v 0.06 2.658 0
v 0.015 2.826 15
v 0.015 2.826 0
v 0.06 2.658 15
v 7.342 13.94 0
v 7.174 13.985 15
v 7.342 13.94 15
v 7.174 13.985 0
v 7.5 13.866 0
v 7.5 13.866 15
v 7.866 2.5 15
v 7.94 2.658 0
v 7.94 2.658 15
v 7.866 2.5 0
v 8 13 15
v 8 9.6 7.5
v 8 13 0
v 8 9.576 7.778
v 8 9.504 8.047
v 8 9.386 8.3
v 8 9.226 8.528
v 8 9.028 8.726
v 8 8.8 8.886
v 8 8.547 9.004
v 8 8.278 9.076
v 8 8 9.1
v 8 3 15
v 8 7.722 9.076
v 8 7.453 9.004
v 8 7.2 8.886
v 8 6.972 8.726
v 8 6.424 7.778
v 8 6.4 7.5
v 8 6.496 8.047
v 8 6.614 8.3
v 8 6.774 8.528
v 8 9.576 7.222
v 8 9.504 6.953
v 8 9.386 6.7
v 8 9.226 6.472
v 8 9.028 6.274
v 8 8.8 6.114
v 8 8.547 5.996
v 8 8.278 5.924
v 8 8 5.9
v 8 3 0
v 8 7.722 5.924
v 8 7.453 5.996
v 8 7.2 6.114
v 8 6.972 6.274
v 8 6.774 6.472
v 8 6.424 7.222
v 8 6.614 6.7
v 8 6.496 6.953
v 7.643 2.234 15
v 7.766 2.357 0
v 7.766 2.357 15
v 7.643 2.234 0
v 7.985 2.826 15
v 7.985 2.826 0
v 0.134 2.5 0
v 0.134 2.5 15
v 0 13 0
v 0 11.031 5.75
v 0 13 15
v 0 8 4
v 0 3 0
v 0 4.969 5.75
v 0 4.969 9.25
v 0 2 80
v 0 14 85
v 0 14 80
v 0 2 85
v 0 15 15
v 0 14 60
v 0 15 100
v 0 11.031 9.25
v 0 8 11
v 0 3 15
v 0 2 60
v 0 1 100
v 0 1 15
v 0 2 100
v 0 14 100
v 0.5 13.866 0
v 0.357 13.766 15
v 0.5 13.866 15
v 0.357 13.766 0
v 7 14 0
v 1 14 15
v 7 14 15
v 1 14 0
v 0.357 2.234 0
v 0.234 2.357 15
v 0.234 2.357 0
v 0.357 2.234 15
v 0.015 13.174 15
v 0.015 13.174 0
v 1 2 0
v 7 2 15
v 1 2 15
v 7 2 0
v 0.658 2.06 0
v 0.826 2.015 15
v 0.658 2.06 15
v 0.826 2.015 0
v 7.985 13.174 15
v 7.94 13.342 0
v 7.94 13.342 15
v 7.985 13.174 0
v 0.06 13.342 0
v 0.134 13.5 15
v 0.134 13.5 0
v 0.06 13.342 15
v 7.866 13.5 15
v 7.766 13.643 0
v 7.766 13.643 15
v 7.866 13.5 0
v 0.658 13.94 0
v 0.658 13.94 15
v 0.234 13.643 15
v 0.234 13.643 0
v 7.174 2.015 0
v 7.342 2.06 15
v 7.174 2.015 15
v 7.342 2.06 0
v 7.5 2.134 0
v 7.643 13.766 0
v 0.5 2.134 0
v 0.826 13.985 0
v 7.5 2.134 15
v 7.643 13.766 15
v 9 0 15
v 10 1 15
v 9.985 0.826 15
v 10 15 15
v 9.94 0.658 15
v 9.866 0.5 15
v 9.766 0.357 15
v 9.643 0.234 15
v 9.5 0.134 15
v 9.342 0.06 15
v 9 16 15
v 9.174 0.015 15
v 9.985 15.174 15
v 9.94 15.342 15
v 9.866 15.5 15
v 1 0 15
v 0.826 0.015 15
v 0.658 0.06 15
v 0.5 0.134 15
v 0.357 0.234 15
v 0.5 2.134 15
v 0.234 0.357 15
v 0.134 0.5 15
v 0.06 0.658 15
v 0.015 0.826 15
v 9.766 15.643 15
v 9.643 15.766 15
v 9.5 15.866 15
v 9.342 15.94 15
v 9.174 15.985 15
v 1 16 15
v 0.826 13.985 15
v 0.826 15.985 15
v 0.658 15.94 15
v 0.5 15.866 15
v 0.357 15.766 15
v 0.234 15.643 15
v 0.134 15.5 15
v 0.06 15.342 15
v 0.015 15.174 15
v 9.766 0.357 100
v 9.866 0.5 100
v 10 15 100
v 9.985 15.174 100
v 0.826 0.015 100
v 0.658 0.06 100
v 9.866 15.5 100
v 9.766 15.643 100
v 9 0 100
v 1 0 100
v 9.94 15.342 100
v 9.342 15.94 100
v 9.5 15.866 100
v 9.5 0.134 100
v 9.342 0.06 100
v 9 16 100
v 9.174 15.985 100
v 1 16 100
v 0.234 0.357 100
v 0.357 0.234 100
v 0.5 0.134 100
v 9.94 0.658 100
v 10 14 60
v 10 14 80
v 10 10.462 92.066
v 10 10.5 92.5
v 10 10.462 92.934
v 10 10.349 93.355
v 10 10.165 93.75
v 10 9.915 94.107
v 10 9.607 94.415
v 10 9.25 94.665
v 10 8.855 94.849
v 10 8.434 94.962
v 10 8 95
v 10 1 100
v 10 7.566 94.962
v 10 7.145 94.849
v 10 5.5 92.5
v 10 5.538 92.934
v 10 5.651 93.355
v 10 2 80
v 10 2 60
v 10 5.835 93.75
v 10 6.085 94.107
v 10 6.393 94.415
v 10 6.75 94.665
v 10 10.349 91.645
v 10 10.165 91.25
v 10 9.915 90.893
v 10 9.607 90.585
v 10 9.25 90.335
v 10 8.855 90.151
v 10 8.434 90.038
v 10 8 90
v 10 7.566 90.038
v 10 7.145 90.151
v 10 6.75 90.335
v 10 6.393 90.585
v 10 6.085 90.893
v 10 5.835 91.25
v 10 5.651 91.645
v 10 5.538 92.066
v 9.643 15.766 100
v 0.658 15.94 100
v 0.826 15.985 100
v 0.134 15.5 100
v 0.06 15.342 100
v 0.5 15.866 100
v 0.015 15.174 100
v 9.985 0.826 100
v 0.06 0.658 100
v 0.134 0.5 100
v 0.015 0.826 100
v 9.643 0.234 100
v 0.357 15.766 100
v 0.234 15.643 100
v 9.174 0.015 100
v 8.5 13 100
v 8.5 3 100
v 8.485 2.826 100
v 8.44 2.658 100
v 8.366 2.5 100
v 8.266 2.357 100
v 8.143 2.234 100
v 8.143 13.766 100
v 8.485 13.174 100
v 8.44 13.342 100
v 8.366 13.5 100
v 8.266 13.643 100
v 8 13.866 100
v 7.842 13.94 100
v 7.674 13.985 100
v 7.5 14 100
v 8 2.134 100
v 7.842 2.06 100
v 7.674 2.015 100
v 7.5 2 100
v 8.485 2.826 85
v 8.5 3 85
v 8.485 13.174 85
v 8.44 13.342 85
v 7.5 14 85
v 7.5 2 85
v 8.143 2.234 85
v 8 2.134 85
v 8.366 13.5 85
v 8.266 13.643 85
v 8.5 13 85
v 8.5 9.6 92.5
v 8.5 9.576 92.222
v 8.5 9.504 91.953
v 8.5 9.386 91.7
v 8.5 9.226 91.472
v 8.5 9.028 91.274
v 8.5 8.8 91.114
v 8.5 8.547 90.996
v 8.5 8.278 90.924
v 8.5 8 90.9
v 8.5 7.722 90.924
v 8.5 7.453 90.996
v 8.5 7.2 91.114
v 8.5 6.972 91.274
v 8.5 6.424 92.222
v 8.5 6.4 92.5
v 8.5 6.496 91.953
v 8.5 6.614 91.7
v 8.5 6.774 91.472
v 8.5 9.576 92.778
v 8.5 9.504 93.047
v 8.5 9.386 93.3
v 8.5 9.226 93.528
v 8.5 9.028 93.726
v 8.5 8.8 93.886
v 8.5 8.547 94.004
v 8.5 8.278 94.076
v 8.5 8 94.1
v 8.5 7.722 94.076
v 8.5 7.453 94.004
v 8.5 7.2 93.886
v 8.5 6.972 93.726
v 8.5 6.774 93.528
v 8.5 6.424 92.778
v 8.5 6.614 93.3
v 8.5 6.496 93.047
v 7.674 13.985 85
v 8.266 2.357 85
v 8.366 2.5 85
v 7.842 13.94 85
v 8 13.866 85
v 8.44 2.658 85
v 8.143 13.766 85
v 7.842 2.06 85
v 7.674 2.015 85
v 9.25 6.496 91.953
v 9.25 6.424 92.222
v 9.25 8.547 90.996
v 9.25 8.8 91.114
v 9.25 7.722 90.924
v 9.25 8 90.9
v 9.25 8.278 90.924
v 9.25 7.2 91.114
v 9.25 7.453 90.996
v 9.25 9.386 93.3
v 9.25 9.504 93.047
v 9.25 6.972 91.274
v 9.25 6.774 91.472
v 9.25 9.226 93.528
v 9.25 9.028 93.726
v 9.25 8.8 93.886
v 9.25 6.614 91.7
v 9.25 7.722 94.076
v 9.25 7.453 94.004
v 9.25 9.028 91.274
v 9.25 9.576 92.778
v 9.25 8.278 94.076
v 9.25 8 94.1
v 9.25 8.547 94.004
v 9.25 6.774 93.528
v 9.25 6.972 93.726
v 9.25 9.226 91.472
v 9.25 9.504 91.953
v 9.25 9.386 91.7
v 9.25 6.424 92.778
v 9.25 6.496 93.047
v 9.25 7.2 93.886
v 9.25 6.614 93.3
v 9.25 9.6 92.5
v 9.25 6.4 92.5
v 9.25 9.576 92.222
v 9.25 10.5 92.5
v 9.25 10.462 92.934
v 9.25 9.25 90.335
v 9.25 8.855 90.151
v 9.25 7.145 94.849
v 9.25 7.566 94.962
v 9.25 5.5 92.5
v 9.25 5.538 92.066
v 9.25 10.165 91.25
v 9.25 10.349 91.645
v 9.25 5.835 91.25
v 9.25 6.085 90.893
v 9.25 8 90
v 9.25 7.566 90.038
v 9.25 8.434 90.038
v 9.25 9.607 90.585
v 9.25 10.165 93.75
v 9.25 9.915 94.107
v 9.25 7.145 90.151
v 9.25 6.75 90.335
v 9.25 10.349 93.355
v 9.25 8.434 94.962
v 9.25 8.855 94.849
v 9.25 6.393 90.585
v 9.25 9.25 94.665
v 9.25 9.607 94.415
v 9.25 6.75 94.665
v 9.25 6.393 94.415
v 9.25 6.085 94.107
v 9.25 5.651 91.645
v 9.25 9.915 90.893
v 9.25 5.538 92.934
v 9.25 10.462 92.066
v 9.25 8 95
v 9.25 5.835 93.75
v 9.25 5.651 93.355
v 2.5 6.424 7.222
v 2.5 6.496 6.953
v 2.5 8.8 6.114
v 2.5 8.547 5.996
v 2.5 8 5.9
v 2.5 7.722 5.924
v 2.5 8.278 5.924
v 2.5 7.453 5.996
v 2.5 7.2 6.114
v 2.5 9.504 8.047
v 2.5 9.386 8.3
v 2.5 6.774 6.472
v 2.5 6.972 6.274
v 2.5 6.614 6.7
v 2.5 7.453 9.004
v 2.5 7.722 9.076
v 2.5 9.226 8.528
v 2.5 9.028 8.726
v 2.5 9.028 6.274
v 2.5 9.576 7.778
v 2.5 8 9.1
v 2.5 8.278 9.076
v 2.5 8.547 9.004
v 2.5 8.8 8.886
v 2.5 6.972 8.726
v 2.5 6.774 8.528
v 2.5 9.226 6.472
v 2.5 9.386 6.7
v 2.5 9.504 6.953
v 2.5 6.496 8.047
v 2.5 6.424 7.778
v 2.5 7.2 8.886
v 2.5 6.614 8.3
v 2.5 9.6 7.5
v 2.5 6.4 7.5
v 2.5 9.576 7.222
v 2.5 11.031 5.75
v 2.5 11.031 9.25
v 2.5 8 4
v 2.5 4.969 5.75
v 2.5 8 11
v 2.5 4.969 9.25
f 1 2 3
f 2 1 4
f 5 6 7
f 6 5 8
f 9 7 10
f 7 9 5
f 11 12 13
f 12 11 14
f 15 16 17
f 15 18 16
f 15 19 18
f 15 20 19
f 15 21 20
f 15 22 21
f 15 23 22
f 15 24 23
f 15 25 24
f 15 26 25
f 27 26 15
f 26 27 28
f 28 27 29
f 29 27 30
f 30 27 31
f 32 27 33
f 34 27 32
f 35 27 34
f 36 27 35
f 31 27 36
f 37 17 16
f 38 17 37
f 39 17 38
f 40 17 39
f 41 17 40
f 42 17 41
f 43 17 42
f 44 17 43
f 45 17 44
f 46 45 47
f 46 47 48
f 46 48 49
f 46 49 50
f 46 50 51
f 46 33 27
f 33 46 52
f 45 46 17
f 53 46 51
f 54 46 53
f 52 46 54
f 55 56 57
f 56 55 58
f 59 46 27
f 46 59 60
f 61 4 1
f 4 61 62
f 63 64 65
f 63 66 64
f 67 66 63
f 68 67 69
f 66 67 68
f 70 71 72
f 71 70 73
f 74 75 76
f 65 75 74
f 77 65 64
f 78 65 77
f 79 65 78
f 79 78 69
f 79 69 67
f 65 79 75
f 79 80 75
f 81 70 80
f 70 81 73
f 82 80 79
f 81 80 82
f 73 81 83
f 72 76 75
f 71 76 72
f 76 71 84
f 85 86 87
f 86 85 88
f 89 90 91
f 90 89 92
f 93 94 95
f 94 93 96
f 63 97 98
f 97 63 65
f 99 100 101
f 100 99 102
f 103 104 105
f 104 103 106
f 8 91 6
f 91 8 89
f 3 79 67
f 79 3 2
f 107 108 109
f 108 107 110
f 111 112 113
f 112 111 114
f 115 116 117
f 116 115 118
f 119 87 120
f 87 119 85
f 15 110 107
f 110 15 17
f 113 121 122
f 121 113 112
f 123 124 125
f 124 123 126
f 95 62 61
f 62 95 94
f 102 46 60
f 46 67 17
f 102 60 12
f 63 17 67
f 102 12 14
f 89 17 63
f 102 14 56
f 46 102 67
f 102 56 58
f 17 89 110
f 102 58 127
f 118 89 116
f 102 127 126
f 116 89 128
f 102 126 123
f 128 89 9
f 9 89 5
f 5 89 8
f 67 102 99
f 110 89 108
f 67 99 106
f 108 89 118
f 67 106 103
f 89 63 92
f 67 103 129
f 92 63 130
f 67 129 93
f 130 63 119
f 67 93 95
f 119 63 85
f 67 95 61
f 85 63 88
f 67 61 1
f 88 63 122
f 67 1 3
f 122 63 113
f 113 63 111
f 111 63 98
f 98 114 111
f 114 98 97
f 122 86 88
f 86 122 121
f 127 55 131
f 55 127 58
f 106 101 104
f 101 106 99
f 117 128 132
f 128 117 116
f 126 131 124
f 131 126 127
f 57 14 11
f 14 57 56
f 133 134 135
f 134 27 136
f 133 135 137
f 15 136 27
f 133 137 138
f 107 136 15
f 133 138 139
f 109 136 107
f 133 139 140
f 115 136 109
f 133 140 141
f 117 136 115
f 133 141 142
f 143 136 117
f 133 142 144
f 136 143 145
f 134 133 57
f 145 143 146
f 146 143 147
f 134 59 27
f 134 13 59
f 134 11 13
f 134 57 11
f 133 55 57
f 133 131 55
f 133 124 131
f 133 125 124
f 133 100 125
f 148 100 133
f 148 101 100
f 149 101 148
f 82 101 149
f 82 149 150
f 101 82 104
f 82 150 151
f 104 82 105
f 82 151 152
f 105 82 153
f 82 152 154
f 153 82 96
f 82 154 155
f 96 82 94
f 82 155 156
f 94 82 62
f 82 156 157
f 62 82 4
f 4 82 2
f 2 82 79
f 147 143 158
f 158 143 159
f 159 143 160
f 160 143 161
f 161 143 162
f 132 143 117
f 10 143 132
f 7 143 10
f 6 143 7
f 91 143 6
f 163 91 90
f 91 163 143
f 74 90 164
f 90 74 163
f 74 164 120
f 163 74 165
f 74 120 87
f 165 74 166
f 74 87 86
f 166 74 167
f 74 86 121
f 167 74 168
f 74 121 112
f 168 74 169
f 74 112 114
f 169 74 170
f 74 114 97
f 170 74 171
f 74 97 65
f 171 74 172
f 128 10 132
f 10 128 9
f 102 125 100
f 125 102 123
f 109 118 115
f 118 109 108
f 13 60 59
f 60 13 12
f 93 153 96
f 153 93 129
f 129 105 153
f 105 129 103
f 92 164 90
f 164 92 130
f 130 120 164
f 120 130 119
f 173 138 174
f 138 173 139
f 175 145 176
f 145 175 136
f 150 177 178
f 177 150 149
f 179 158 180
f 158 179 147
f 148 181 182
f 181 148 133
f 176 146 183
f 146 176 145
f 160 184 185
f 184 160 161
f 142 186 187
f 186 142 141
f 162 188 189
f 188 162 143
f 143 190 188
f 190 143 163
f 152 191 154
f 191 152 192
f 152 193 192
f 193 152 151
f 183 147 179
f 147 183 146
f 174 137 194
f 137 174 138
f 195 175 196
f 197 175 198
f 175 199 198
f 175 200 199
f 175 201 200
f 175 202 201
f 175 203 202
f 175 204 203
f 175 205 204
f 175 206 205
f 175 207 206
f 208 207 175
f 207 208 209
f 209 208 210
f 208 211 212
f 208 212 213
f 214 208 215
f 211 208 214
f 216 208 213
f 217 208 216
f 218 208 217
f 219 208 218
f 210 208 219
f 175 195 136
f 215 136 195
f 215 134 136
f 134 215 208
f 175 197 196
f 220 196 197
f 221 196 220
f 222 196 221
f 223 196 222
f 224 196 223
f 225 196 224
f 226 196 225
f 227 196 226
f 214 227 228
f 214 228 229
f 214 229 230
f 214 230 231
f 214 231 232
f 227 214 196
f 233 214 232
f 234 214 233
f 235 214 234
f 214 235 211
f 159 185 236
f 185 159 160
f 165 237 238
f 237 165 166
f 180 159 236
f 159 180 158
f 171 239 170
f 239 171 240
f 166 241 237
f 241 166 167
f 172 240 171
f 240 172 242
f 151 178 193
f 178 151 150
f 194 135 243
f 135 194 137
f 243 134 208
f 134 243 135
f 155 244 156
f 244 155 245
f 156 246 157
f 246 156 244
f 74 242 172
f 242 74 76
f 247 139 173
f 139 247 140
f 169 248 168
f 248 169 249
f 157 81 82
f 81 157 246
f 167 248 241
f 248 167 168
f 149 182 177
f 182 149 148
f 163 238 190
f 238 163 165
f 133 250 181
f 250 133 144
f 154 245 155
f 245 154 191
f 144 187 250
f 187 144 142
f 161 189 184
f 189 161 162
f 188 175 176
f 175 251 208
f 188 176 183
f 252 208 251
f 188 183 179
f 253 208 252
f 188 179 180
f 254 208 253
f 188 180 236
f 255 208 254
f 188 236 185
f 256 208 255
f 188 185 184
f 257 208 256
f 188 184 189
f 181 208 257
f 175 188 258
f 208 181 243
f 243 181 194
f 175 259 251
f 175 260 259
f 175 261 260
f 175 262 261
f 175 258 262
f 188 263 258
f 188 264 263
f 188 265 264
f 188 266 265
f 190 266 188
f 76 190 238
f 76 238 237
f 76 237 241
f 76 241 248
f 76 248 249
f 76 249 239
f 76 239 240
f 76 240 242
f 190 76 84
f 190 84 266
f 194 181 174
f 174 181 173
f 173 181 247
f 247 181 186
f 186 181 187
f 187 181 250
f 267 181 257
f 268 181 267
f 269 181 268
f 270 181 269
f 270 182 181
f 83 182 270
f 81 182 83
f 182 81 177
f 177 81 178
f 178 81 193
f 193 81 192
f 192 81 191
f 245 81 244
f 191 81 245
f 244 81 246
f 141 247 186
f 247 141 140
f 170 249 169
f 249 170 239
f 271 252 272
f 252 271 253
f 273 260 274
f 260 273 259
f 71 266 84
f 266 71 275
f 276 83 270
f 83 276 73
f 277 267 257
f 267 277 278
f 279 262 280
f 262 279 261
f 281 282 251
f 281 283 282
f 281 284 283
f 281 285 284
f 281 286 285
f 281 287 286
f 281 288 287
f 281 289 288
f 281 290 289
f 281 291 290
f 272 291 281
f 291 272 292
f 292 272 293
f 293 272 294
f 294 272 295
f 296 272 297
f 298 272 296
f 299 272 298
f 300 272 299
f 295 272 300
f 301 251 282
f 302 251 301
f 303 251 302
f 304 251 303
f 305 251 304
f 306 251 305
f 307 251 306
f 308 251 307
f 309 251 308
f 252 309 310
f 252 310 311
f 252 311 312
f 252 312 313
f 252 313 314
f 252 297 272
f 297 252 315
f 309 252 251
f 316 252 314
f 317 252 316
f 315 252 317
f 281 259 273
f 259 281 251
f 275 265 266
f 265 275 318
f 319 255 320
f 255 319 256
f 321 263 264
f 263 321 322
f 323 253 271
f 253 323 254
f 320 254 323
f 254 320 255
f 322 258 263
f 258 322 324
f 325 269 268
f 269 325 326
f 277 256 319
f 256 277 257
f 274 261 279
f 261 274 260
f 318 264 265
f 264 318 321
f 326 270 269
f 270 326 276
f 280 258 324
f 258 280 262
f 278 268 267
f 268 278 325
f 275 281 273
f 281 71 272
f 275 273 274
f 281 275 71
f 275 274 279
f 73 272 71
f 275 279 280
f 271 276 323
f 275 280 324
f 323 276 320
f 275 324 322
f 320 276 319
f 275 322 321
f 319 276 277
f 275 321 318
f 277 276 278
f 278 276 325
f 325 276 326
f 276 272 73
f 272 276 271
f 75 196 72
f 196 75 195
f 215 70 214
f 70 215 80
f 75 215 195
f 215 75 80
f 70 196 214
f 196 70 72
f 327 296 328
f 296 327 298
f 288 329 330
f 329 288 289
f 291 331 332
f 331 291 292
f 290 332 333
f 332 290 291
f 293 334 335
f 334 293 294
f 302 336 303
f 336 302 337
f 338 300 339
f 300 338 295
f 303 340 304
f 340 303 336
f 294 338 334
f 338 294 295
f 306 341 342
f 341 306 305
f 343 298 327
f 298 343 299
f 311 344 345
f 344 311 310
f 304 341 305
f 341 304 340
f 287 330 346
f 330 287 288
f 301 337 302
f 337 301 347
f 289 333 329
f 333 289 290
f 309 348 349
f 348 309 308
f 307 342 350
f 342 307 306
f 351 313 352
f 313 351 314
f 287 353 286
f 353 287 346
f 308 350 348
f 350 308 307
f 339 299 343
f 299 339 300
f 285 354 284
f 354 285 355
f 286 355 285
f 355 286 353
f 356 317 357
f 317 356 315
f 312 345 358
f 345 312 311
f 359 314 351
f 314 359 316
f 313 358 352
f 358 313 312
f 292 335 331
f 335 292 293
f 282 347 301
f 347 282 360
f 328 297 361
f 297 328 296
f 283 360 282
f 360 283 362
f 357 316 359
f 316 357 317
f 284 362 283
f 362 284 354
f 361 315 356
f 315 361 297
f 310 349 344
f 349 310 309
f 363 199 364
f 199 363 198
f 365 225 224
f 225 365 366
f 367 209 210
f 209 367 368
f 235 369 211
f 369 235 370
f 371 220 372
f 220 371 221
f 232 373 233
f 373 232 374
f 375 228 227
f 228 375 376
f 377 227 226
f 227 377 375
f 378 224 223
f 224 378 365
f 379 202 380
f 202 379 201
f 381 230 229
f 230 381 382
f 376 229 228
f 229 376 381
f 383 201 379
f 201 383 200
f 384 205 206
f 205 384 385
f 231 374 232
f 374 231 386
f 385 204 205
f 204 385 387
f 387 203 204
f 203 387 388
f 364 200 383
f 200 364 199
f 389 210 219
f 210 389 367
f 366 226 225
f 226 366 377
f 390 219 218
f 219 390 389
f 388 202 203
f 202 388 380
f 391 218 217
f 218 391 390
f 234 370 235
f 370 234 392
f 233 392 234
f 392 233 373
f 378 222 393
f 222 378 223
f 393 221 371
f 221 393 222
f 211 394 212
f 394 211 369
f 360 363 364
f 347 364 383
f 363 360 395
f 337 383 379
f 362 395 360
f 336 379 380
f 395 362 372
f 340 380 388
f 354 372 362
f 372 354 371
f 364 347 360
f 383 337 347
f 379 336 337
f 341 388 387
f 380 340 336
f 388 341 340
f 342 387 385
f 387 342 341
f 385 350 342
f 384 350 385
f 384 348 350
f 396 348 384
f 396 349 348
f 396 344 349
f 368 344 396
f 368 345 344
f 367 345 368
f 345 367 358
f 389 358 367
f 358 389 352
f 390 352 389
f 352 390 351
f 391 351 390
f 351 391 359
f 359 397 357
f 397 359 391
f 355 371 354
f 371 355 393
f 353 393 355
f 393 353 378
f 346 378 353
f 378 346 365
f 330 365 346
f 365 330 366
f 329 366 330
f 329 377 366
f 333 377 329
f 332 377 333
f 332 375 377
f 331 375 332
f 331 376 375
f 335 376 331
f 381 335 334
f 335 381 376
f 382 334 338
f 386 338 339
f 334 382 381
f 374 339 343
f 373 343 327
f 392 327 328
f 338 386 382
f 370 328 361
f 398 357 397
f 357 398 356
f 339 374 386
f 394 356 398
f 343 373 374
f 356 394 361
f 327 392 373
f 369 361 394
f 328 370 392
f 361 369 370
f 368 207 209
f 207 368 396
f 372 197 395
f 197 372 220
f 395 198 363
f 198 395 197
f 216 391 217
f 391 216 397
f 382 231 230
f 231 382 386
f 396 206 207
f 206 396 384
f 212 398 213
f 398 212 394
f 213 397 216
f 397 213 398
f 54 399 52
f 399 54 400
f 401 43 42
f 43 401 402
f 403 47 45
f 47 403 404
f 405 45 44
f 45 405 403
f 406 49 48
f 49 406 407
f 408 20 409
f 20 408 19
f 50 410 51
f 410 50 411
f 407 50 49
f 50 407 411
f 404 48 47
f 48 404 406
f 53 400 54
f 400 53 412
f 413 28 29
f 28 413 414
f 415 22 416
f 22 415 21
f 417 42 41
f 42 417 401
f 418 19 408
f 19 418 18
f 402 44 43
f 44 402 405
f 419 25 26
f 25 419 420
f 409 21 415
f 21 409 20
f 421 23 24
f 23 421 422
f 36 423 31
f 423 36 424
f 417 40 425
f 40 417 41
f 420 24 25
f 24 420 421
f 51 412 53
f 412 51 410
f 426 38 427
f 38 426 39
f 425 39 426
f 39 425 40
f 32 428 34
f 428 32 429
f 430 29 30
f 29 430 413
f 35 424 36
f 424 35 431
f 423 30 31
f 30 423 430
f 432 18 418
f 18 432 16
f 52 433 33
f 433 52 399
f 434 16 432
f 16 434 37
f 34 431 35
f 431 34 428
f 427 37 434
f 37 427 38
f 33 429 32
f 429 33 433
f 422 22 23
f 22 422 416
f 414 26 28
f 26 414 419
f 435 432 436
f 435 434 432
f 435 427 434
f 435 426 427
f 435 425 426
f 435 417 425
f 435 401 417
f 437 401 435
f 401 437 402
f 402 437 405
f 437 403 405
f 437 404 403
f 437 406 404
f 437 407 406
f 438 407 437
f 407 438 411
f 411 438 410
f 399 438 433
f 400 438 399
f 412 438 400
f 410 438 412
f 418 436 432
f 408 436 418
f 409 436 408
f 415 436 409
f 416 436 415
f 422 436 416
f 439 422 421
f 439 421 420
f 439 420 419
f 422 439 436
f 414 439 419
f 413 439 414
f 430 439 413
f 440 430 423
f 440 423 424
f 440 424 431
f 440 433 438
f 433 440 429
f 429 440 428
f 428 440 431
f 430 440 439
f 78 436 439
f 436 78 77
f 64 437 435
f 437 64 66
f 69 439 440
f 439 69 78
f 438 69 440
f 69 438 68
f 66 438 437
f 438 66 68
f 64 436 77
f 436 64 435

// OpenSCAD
/*
 * Tidegrow Pillar
 * Copyright (c) 2022 Lone Dynamics Corporation. All rights reserved.
 *
 */ 

$fn = 36;

pillar();
 
module pillar() {

	p_height = 100;
	p_width = 16;
	p_depth = 10;
	p_roundness = 1;

	pn_height = 15;
	pn_width = 12;
	pn_depth = 8;
	pn_roundness = 1;
	
	difference() {
		
		union () {
			
			translate([0,(p_width/2)-(pn_width/2),0])
				roundedcube(pn_depth, pn_width, pn_height, p_roundness);
			
			translate([0,0,pn_height])
				roundedcube(p_depth, p_width, p_height-pn_height, pn_roundness);
		}
		
		translate([-1,(p_width/2)-(pn_width/2),p_height-pn_height])
			roundedcube(1.5+pn_depth, pn_width, pn_height, pn_roundness);

		// cable cutouts
		translate([-1,(p_width/2)-(pn_width/2),p_height-pn_height-25])
			roundedcube(50, pn_width, 20, pn_roundness);

		// top bolt hole
		translate([0,(p_width/2),p_height-(pn_height/2)])
			rotate([0,90,0])
				cylinder(d=3.2, h=10);

		// top countersink
		translate([p_depth-0.75,(p_width/2),p_height-(pn_height/2)])
			rotate([0,90,0])
				cylinder(d=5, h=10);
			
		// bottom bolt hole
		translate([0,(p_width/2),pn_height/2])
			rotate([0,90,0])
				cylinder(d=3.2, h=10);

		// bottom nut hole
		translate([0,(p_width/2),pn_height/2])
			rotate([0,90,0])
				cylinder(d=7, h=2.5, $fn=6);
		
	}
	
}


// https://gist.github.com/tinkerology/ae257c5340a33ee2f149ff3ae97d9826
module roundedcube(xx, yy, height, radius)
{
    translate([0,0,height/2])
    hull()
    {
        translate([radius,radius,0])
        cylinder(height,radius,radius,true);

        translate([xx-radius,radius,0])
        cylinder(height,radius,radius,true);

        translate([xx-radius,yy-radius,0])
        cylinder(height,radius,radius,true);

        translate([radius,yy-radius,0])
        cylinder(height,radius,radius,true);
    }
}
